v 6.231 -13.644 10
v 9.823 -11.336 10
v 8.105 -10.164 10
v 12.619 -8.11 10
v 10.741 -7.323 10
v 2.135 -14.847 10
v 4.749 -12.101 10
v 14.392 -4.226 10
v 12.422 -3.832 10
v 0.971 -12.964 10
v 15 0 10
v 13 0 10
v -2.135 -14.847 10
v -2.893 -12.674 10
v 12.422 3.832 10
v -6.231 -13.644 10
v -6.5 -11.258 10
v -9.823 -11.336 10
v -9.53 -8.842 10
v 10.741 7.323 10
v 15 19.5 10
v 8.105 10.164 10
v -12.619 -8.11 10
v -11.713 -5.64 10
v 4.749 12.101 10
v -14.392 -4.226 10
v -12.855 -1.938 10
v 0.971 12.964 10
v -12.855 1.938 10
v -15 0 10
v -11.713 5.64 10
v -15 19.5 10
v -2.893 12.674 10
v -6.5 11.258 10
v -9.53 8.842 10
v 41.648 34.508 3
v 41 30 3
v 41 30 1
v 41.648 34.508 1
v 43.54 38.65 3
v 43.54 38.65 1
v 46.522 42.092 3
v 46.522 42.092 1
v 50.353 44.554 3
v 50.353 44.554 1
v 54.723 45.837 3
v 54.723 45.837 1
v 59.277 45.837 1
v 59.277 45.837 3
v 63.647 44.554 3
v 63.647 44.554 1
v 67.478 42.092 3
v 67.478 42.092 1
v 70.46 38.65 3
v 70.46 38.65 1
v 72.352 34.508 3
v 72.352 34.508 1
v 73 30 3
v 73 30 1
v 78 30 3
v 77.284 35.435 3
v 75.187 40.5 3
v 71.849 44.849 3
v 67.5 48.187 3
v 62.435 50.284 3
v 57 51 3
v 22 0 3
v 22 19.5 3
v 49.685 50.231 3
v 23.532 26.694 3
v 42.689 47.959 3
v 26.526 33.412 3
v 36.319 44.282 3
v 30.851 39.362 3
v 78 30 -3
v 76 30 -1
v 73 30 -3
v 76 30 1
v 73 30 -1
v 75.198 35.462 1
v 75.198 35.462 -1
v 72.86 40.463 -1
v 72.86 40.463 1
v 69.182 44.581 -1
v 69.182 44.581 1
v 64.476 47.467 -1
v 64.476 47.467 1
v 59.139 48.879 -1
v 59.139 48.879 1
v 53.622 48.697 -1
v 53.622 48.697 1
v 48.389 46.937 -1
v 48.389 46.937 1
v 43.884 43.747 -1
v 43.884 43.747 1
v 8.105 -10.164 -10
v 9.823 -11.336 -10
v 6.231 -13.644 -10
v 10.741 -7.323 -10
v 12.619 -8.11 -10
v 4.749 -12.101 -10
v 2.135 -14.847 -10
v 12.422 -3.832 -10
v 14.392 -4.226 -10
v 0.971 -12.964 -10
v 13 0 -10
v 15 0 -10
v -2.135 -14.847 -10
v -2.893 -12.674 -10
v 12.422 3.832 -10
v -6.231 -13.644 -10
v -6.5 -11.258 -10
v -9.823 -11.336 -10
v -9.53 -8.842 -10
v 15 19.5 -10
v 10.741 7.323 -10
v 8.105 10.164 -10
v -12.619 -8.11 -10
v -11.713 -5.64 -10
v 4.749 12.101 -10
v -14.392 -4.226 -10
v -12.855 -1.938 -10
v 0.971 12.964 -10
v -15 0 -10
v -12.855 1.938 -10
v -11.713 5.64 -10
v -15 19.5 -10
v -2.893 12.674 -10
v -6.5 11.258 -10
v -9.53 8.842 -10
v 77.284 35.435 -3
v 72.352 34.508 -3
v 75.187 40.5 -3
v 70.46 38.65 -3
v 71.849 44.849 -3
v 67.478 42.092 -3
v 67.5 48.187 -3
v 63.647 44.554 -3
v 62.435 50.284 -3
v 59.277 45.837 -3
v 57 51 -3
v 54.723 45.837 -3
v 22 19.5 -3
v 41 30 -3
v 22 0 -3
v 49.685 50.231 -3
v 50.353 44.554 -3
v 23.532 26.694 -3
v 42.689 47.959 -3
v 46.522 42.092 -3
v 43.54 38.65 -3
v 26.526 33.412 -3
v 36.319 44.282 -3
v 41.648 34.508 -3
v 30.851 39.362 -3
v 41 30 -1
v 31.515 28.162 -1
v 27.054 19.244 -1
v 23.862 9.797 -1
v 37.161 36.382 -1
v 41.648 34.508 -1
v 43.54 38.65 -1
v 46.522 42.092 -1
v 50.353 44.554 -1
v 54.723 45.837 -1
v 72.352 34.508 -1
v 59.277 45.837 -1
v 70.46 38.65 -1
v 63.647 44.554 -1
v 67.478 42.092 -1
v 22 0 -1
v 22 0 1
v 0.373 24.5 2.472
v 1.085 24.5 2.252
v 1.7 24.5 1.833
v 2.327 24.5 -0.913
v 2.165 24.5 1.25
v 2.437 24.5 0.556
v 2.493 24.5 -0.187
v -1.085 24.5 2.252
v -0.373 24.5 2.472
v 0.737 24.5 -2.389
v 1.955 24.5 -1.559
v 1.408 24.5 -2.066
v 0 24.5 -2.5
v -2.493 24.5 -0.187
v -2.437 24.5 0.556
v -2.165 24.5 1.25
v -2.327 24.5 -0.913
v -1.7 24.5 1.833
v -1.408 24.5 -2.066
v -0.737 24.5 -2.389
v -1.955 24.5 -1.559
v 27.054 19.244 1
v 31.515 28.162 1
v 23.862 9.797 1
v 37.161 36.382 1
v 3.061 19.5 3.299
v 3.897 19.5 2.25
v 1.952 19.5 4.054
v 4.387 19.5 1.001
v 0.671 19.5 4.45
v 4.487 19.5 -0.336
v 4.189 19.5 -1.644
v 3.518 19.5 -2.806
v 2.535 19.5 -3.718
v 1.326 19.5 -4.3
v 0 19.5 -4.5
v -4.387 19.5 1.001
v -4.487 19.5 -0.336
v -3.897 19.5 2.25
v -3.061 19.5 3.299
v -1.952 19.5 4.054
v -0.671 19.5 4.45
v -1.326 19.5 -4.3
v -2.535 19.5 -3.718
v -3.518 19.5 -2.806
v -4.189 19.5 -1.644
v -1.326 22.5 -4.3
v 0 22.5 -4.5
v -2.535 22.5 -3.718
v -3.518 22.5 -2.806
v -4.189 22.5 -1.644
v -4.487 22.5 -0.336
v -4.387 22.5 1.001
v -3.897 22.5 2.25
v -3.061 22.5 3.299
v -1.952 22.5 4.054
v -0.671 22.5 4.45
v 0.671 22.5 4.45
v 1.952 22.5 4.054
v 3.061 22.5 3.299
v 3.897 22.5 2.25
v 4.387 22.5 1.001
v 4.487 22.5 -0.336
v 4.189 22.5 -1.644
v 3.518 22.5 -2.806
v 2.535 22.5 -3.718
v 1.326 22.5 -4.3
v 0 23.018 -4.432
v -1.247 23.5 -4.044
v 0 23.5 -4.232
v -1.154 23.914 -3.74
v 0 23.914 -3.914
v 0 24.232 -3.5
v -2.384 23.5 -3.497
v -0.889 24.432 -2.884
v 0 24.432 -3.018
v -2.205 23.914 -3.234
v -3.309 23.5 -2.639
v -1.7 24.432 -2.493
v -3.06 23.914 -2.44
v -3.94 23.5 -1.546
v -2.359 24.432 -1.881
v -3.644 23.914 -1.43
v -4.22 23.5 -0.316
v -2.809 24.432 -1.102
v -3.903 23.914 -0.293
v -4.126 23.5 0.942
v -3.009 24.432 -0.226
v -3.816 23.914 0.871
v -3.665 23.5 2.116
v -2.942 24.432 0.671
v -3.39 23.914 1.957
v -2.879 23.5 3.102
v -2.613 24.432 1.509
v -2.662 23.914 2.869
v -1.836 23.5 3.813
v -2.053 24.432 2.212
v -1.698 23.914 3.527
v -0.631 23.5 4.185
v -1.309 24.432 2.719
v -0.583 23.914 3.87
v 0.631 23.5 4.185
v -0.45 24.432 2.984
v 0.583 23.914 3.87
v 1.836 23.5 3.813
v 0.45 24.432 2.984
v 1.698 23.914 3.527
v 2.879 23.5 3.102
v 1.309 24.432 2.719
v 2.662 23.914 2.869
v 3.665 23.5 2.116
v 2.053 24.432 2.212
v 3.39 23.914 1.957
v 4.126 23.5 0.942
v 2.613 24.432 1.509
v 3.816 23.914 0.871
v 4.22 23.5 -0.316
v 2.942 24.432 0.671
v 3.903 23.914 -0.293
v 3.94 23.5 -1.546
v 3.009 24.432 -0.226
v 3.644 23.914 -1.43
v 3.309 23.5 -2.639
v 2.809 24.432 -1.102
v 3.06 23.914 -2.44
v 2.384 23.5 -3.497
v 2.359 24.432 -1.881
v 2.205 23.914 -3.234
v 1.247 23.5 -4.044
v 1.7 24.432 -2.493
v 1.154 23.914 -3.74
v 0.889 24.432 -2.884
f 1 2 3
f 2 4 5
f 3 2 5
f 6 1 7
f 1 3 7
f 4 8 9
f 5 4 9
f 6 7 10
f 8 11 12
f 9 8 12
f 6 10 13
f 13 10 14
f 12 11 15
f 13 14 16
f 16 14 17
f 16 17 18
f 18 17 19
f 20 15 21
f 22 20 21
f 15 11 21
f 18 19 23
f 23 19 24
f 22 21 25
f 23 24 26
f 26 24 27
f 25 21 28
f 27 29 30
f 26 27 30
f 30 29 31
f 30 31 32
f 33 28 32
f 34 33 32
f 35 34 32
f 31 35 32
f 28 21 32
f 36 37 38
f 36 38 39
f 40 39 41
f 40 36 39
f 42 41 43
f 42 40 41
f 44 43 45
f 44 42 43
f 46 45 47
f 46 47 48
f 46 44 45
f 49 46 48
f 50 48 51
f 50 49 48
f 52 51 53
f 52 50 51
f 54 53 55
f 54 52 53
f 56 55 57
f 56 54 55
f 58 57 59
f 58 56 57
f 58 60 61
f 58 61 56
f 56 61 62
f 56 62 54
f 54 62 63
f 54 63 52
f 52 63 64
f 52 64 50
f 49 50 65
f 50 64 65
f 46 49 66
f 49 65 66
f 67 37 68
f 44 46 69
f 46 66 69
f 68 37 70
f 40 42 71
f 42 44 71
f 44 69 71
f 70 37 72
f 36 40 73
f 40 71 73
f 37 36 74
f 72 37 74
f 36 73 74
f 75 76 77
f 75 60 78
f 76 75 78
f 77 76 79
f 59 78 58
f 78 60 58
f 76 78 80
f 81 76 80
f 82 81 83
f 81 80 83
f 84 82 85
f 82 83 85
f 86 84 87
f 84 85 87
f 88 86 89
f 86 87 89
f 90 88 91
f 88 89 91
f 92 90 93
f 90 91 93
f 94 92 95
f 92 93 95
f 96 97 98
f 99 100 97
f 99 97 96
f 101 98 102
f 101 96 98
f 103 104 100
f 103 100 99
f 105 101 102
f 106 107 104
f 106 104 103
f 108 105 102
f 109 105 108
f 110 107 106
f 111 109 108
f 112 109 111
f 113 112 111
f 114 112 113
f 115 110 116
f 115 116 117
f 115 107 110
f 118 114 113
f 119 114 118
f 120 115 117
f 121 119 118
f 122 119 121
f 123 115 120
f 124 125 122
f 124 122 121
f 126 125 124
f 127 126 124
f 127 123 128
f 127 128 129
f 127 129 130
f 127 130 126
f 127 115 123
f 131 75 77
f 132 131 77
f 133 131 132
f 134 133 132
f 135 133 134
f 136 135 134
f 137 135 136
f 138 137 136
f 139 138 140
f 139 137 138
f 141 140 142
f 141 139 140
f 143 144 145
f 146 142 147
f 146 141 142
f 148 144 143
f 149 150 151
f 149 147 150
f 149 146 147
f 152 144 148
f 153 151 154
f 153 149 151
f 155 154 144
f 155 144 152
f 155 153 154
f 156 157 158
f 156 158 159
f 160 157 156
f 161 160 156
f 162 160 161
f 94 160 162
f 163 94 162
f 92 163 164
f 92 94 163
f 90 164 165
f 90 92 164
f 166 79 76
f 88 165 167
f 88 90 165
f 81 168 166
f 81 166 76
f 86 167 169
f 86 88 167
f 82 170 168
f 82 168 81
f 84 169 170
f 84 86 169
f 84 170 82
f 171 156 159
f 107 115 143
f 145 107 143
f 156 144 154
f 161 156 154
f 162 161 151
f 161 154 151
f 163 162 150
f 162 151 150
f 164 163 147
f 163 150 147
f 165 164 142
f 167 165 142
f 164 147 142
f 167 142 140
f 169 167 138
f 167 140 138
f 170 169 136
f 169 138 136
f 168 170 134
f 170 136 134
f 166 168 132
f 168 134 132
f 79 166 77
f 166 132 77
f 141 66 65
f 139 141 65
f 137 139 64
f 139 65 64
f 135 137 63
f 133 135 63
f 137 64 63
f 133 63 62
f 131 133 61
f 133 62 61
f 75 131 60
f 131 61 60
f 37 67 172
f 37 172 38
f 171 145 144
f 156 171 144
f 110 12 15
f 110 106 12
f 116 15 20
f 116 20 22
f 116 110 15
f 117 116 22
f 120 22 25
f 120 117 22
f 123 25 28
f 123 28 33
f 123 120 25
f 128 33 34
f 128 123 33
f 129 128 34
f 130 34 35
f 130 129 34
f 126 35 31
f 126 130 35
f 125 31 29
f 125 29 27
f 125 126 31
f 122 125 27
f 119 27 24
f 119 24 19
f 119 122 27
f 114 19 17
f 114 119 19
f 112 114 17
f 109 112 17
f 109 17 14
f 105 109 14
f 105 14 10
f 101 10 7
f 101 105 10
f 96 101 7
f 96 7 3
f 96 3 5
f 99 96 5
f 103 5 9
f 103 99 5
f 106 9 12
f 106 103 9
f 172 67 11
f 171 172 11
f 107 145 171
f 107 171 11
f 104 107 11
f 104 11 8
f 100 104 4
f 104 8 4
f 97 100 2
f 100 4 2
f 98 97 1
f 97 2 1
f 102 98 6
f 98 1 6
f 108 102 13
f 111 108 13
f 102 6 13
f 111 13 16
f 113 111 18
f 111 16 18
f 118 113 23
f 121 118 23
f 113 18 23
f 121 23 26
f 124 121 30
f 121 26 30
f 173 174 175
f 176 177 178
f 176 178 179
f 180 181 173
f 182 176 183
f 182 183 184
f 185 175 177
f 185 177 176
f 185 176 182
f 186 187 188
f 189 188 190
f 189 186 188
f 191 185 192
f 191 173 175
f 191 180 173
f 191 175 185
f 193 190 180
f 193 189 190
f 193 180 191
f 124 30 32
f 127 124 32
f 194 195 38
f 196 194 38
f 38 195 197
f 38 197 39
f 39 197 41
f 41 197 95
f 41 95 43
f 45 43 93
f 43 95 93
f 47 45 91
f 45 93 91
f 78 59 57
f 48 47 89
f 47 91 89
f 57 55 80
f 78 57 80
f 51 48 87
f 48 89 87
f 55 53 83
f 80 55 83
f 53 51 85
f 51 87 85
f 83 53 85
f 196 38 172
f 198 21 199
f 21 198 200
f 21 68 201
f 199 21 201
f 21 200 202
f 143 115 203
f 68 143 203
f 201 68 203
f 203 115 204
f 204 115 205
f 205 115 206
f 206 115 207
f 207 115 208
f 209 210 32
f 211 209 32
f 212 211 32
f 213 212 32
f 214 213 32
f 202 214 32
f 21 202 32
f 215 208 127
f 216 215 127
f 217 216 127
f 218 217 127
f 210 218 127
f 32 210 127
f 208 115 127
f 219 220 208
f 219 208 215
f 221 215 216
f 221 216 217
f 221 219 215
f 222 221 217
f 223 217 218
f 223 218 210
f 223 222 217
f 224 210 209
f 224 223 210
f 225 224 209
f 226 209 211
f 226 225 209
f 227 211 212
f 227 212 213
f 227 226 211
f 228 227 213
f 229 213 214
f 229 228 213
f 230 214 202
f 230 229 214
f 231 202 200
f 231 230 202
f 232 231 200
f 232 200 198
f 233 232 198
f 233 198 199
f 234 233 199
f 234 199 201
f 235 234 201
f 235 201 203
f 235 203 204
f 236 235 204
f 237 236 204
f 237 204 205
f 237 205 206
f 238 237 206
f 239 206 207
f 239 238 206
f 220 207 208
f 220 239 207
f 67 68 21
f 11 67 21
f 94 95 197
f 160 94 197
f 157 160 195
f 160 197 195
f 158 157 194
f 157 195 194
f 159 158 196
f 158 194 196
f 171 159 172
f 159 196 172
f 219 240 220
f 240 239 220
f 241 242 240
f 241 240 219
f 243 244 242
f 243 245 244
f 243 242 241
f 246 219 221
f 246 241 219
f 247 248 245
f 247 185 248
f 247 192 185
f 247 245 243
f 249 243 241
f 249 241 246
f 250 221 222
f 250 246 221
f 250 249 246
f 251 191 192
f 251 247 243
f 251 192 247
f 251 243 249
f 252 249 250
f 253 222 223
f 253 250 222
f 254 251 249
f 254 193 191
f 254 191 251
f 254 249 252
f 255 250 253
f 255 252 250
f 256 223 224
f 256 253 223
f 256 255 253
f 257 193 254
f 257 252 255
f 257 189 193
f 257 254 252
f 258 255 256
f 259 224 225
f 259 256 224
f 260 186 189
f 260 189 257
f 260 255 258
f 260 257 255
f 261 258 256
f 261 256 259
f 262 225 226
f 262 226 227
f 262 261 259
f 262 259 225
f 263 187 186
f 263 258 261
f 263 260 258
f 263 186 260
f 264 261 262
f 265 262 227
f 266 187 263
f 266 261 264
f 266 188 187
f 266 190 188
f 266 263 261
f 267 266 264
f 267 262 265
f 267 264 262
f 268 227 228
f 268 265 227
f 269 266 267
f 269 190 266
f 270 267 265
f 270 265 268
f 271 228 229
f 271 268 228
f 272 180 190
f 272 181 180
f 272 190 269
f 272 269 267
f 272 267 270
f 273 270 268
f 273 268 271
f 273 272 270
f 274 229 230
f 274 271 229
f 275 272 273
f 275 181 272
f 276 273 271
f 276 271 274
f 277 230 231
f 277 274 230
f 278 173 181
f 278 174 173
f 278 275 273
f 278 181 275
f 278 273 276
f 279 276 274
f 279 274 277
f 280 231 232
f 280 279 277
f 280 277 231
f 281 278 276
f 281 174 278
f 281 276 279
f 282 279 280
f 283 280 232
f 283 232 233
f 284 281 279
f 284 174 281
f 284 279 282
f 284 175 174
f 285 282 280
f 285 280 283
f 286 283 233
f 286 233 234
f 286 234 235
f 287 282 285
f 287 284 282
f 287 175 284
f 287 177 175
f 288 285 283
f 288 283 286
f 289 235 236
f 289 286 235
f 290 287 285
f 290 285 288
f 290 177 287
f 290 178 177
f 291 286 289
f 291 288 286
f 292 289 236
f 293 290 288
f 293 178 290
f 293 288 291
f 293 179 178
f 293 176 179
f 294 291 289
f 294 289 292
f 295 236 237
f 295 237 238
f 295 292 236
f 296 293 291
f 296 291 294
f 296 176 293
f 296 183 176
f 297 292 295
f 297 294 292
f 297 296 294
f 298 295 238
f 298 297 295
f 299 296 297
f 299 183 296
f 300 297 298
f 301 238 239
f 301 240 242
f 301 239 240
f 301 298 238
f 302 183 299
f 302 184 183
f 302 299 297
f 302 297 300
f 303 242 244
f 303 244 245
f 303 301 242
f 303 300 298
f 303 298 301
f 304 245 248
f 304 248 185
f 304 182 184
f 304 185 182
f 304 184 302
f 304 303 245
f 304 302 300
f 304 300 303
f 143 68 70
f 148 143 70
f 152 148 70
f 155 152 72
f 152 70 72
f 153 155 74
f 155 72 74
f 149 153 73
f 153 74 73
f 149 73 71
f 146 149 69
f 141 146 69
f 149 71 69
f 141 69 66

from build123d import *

# Parameters (mm, degrees)
SKETCH1_R           = 13
BOSS_EXTRUDE1_DEPTH = 10
BOSS_EXTRUDE2_DEPTH = 19.5
BOSS_EXTRUDE3_DEPTH = 3
BOSS_EXTRUDE4_DEPTH = 2
SKETCH5_R           = 4.5
BOSS_EXTRUDE5_DEPTH = 5
FILLET1_R           = 2


with BuildPart() as part:
    # Sketch1 → Boss-Extrude1 (new, symmetric)
    with BuildSketch(Plane.XY):
        with BuildLine():
            Line((-15, 0), (-15, 19.5))
            Line((-15, 19.5), (15, 19.5))
            Line((15, 19.5), (15, 0))
            ThreePointArc((15, 0), (0, -15), (-15, 0))
        make_face()
        Circle(SKETCH1_R, mode=Mode.SUBTRACT)
    extrude(amount=BOSS_EXTRUDE1_DEPTH, both=True)

    # Sketch3 → Boss-Extrude2 (add)
    with BuildSketch(Plane(origin=(0, 19.5, 0), x_dir=(1, 0, 0), z_dir=(0, 1, 0))):
        Polygon((15, 10), (22, 3), (22, -3), (15, -10), align=None)
    extrude(amount=-BOSS_EXTRUDE2_DEPTH)

    # Sketch2 → Boss-Extrude3 (add, symmetric)
    with BuildSketch(Plane.XY):
        with BuildLine():
            Line((78, 30), (76, 30))
            ThreePointArc((76, 30), (64.47643512, 47.467195479), (43.88390338, 43.74656355))
            ThreePointArc((43.88390338, 43.74656355), (29.130686528, 23.779839726), (22, 0))
            Line((22, 0), (22, 19.5))
            ThreePointArc((22, 19.5), (33.456157918, 41.965380092), (57, 51))
            ThreePointArc((57, 51), (71.849242405, 44.849242405), (78, 30))
        make_face()
    extrude(amount=BOSS_EXTRUDE3_DEPTH, both=True)


with BuildPart() as body_2:
    # Sketch4 → Boss-Extrude4 (new body)
    with BuildSketch(Plane.XY.offset(3)):
        with BuildLine():
            Line((73, 30), (76, 30))
            ThreePointArc((76, 30), (64.47643512, 47.467195479), (43.88390338, 43.74656355))
            ThreePointArc((43.88390338, 43.74656355), (29.130686528, 23.779839726), (22, 0))
            Line((22, 0), (41, 30))
            ThreePointArc((41, 30), (57, 46), (73, 30))
        make_face()
    extrude(amount=-BOSS_EXTRUDE4_DEPTH)


with BuildPart() as body_3:
    # Mirror1: mirrored copy
    add(body_2.part.mirror(Plane.XY))


with BuildPart() as body_2_1:
    add(body_2.part)

    # Combine2: union body 3, part
    add(body_3.part)
    add(part.part)

    # Sketch5 → Boss-Extrude5 (add, symmetric)
    with BuildSketch(Plane(origin=(0, 19.5, 0), x_dir=(1, 0, 0), z_dir=(0, 1, 0))):
        with Locations(Location((0, 0, 0), (0, 0, 90))):
            Circle(SKETCH5_R)
    extrude(amount=BOSS_EXTRUDE5_DEPTH, both=True)

    # Fillet1
    fillet1_edges = [body_2_1.edges().sort_by_distance(p)[0] for p in [
        (0, 24.5, 4.5),
    ]]
    fillet(fillet1_edges, radius=FILLET1_R)


solid = body_2_1.part
